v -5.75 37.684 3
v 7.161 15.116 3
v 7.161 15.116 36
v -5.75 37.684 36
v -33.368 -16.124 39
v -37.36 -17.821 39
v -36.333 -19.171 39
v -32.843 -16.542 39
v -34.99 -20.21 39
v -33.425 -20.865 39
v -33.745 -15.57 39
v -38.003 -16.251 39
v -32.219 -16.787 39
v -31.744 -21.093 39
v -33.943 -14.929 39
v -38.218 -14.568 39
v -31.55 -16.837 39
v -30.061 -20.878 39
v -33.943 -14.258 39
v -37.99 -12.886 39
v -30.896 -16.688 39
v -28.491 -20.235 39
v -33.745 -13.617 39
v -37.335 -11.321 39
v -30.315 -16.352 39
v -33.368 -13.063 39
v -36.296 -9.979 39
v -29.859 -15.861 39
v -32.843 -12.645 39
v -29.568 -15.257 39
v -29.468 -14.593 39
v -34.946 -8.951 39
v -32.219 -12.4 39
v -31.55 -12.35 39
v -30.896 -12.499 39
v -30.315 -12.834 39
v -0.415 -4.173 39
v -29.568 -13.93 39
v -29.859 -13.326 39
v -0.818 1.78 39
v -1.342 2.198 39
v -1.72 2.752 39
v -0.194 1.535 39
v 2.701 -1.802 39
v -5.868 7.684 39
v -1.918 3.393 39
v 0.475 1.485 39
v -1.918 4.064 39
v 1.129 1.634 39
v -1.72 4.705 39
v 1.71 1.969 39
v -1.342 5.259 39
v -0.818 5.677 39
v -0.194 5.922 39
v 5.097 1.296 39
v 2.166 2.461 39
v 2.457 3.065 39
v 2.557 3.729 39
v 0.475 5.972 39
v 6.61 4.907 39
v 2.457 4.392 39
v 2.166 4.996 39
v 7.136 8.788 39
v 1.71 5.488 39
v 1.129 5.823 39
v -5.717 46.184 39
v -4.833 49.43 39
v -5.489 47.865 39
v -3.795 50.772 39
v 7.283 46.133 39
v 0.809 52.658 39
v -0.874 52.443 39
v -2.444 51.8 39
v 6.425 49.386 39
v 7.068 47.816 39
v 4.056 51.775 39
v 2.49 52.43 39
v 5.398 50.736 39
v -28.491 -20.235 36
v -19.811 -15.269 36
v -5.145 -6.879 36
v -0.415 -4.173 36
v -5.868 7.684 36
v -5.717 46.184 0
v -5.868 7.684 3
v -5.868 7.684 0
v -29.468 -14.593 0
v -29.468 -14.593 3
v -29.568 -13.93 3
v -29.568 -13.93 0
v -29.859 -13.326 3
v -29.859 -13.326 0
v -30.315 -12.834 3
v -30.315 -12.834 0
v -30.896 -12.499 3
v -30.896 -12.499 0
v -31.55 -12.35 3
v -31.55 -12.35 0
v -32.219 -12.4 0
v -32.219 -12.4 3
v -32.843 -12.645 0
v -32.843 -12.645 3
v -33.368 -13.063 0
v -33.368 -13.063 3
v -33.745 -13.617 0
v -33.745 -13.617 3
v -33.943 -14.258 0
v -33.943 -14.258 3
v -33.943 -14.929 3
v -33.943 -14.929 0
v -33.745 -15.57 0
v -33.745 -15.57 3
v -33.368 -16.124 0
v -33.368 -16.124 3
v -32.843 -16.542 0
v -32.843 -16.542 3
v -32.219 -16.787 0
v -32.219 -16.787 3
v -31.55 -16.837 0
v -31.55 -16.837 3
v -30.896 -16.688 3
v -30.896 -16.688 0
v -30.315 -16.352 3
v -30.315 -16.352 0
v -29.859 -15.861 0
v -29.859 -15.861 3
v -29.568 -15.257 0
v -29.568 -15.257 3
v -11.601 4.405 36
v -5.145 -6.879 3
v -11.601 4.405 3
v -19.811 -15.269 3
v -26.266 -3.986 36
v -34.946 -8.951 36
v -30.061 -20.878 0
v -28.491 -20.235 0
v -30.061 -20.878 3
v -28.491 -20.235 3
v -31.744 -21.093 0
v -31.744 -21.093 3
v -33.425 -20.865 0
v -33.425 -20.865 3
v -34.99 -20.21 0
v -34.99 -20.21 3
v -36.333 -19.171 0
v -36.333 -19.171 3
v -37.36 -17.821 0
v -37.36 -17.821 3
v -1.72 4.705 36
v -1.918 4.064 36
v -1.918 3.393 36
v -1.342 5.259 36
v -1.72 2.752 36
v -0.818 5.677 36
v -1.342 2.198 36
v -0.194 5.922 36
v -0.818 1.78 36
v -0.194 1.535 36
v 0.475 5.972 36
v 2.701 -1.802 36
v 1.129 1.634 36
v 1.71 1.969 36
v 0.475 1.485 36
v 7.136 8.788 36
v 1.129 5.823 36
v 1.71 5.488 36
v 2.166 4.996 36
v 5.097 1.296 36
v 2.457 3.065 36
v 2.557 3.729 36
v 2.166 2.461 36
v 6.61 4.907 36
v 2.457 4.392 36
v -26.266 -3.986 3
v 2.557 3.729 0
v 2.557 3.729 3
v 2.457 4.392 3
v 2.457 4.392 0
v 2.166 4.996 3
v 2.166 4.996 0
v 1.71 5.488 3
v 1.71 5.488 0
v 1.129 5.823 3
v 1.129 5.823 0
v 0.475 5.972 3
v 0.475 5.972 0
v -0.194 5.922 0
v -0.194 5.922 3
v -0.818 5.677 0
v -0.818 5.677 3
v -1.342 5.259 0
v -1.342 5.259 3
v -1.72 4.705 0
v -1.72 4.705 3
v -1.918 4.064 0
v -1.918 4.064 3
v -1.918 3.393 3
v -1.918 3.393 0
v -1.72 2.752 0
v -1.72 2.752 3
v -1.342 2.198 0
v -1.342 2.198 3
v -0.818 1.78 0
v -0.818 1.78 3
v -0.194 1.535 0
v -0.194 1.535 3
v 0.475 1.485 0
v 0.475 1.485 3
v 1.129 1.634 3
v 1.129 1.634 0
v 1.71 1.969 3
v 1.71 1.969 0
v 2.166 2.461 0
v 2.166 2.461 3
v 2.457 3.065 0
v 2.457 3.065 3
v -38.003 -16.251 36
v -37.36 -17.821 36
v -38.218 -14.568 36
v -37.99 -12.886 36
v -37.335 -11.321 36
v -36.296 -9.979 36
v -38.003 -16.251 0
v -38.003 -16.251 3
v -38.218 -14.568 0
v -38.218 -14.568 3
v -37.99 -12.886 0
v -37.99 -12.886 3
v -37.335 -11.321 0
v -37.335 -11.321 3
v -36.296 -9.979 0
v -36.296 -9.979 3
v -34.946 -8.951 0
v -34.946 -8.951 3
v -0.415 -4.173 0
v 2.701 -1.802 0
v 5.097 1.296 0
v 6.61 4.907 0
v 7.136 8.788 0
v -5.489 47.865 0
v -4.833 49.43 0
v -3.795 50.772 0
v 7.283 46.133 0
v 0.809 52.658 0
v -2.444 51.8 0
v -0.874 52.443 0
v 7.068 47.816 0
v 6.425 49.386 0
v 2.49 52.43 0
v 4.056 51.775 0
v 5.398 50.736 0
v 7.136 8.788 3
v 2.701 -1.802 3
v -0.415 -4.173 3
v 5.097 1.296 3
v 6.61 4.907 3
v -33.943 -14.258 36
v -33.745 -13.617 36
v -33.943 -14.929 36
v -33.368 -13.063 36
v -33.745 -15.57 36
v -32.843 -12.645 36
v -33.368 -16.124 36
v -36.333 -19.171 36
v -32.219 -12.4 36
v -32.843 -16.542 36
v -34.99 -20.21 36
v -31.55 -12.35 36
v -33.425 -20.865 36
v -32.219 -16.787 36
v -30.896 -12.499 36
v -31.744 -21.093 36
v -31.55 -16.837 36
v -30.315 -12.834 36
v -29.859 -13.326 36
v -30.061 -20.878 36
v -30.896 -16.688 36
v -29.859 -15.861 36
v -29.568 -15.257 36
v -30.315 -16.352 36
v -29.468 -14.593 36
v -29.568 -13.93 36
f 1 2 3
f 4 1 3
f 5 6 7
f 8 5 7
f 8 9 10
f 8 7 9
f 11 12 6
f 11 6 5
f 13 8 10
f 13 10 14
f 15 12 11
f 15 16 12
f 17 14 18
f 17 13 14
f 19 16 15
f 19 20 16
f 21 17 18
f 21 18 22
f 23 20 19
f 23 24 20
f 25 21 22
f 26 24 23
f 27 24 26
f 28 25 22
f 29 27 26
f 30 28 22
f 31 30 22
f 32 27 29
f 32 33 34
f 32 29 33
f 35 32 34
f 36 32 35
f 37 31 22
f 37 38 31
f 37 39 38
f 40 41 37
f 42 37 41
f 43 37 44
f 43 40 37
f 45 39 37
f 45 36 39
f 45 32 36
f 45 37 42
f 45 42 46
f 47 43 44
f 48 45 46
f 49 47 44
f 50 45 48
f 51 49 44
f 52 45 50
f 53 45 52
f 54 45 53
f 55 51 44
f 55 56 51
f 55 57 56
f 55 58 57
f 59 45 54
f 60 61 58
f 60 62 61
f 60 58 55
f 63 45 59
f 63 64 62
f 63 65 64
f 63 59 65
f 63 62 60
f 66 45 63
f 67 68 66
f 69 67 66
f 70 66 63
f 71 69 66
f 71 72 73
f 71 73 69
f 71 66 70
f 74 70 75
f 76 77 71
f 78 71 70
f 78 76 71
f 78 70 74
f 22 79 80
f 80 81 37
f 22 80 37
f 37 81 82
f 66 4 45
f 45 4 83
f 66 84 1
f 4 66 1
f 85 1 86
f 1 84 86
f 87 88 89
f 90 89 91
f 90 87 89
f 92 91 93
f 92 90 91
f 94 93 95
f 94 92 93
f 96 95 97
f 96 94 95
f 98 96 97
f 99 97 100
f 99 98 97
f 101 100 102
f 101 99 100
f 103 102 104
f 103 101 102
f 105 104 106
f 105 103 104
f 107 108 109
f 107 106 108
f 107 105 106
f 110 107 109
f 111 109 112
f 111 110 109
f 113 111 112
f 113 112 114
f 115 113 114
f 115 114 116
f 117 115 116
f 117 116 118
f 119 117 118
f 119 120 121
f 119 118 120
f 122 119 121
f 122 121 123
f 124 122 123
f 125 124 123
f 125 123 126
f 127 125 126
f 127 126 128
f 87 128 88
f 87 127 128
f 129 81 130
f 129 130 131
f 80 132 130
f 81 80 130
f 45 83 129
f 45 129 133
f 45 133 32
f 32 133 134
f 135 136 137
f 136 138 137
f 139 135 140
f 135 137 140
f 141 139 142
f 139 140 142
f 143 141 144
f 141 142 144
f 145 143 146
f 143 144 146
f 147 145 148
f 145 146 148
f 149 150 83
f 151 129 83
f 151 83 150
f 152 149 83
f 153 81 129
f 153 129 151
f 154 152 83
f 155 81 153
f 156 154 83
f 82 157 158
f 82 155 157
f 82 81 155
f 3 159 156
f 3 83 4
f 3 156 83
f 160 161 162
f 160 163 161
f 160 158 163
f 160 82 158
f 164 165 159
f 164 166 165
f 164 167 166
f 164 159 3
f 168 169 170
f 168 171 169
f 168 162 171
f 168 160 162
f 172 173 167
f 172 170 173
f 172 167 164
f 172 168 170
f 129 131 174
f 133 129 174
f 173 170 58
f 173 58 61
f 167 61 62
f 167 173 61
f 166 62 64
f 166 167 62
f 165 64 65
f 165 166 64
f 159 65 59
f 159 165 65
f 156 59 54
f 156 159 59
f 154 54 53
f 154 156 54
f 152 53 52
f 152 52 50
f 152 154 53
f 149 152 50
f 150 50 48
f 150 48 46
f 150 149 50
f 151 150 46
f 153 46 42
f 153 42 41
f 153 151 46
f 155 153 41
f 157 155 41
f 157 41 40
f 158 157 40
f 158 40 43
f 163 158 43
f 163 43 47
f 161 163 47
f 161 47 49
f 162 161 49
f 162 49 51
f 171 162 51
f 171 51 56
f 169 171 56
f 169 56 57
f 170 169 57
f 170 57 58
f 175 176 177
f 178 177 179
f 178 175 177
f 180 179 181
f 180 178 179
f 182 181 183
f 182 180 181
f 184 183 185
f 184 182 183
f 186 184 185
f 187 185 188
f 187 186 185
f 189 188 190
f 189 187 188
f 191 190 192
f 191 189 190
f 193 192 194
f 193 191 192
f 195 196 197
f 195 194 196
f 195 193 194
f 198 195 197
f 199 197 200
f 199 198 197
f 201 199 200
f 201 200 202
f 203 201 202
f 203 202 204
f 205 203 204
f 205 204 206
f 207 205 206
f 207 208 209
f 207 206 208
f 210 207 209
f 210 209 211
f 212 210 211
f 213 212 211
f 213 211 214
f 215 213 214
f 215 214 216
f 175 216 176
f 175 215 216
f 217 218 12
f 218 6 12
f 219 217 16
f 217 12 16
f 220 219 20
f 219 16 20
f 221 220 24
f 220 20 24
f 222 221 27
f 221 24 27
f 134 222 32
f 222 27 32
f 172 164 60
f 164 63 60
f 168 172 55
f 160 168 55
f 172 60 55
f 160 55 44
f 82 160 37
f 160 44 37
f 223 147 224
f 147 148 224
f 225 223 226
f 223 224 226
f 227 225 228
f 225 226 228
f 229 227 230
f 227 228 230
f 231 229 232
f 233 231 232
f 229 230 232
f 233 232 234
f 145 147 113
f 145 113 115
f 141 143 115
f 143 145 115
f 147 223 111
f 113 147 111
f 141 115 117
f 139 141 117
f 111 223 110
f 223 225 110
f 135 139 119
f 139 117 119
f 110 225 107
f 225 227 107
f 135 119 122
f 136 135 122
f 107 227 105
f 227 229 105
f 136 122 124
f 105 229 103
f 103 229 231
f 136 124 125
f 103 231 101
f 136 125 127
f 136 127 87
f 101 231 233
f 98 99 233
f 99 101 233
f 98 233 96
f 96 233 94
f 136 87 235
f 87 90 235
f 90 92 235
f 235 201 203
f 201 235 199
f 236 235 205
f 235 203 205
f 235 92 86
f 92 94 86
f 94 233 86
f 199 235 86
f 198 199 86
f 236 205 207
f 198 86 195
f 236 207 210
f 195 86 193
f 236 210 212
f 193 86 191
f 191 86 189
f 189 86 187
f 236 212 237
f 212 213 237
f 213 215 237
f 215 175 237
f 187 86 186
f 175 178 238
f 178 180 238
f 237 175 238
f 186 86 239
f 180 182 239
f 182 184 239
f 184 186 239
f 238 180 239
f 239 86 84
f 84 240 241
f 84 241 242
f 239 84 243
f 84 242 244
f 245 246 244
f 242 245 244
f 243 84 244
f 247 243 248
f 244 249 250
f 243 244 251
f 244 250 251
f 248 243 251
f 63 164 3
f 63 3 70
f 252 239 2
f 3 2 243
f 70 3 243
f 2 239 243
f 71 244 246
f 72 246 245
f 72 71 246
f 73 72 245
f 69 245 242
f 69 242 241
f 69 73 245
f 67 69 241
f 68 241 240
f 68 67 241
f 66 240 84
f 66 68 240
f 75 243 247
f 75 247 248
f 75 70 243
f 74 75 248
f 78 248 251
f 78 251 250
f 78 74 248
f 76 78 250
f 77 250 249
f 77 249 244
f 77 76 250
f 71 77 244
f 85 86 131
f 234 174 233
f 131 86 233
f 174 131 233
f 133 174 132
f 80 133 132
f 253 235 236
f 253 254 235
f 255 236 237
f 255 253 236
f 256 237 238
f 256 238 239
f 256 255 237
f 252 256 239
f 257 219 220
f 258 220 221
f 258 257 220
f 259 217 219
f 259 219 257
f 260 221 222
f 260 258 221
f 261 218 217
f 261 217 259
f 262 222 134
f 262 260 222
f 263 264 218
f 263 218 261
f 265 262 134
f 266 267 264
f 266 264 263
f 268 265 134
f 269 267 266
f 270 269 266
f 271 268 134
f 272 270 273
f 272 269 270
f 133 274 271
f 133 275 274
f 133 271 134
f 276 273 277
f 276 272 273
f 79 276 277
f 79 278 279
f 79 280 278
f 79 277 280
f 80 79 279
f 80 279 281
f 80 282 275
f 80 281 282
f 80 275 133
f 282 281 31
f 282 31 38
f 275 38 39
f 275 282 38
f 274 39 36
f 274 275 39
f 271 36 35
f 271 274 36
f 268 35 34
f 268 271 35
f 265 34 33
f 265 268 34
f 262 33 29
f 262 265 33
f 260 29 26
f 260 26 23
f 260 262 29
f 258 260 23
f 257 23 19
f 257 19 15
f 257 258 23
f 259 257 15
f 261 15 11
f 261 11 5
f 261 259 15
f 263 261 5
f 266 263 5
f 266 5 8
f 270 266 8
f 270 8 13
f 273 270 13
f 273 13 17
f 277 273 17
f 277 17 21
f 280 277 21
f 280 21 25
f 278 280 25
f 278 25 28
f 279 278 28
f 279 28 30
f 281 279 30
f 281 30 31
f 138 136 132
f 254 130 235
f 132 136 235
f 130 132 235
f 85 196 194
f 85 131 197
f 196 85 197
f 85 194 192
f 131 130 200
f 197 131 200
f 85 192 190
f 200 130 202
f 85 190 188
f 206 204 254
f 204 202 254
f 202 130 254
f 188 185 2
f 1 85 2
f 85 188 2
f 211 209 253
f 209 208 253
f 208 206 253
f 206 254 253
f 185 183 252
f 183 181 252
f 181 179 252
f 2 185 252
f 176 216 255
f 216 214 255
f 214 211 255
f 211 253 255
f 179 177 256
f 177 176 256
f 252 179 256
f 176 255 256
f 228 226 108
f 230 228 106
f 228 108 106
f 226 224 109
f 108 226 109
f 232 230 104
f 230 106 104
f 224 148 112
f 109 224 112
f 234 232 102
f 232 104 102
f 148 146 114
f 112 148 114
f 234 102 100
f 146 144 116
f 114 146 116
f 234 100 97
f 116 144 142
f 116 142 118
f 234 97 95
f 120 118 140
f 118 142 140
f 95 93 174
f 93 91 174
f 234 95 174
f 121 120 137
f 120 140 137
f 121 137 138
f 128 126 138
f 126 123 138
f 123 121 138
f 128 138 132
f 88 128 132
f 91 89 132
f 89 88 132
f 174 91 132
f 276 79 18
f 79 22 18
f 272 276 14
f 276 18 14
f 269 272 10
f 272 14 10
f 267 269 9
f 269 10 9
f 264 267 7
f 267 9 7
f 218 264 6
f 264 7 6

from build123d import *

# Parameters (mm, degrees)
SKETCH1_R           = 2.25
BOSS_EXTRUDE1_DEPTH = 39
SKETCH2_W           = 55
SKETCH2_H           = 33
CUT_EXTRUDE1_DEPTH  = 81.036070374
FILLET1_R           = 6.5
FILLET2_R           = 15
BOSS_EXTRUDE2_REACH = 76.379
FILLET3_R           = 6.5


with BuildPart() as part:
    # Sketch1 → Boss-Extrude1 (new body)
    with BuildSketch(Plane.XY):
        Polygon((7.10189894, 0.127356388), (7.308909237, 52.632501802), (-5.690989724, 52.683756073), (-5.868408354, 7.684105823), (-40.588007992, -12.179161807), (-34.132446013, -23.46303169), align=None)
        with Locations((-31.718292061, -14.593315758)):
            Circle(SKETCH1_R, mode=Mode.SUBTRACT)
        with Locations((0.306965546, 3.728504465)):
            Circle(SKETCH1_R, mode=Mode.SUBTRACT)
    extrude(amount=BOSS_EXTRUDE1_DEPTH)

    # Sketch2 → Cut-Extrude1 (cut, through all)
    with BuildSketch(Plane(origin=(1.696387072, -2.965165705, 0), x_dir=(0.8679899909572786, 0.49658169075992264, 0), z_dir=(0.4965816907599227, -0.8679899909572787, 0))):
        with Locations((-13.777933453, 19.5)):
            Rectangle(SKETCH2_W, SKETCH2_H)
    extrude(amount=-CUT_EXTRUDE1_DEPTH, mode=Mode.SUBTRACT)

    # Fillet1
    fillet1_edges = [part.edges().sort_by_distance(p)[0] for p in [
        (-34.132446013, -23.46303169, 1.5),
        (-40.588007992, -12.179161807, 1.5),
        (-34.132446013, -23.46303169, 37.5),
        (-40.588007992, -12.179161807, 37.5),
    ]]
    fillet(fillet1_edges, radius=FILLET1_R - 0.0001)  # a hair under: the kernel refuses the full size

    # Fillet2
    fillet2_edges = [part.edges().sort_by_distance(p)[0] for p in [
        (7.10189894, 0.127356388, 37.5),
        (7.10189894, 0.127356388, 1.5),
    ]]
    fillet(fillet2_edges, radius=FILLET2_R)

    # Sketch3 → Boss-Extrude2 (add, up to next)
    with BuildSketch(Plane.XY.offset(3), mode=Mode.PRIVATE) as boss_extrude2_sk1:
        Polygon((-26.266173142, -3.98556391), (-19.810611162, -15.269433792), (-5.145153373, -6.879247384), (-11.600715353, 4.404622498), align=None)
    boss_extrude2_tool1 = extrude(boss_extrude2_sk1.sketch, amount=BOSS_EXTRUDE2_REACH, mode=Mode.PRIVATE) - part.part
    add(boss_extrude2_tool1.solids().sort_by_distance((-15.705663, -5.432406, 3))[0])

    # Fillet3
    fillet3_edges = [part.edges().sort_by_distance(p)[0] for p in [
        (7.308909237, 52.632501802, 19.5),
        (-5.690989724, 52.683756073, 19.5),
    ]]
    fillet(fillet3_edges, radius=FILLET3_R - 0.0001)  # a hair under: the kernel refuses the full size


solid = part.part
